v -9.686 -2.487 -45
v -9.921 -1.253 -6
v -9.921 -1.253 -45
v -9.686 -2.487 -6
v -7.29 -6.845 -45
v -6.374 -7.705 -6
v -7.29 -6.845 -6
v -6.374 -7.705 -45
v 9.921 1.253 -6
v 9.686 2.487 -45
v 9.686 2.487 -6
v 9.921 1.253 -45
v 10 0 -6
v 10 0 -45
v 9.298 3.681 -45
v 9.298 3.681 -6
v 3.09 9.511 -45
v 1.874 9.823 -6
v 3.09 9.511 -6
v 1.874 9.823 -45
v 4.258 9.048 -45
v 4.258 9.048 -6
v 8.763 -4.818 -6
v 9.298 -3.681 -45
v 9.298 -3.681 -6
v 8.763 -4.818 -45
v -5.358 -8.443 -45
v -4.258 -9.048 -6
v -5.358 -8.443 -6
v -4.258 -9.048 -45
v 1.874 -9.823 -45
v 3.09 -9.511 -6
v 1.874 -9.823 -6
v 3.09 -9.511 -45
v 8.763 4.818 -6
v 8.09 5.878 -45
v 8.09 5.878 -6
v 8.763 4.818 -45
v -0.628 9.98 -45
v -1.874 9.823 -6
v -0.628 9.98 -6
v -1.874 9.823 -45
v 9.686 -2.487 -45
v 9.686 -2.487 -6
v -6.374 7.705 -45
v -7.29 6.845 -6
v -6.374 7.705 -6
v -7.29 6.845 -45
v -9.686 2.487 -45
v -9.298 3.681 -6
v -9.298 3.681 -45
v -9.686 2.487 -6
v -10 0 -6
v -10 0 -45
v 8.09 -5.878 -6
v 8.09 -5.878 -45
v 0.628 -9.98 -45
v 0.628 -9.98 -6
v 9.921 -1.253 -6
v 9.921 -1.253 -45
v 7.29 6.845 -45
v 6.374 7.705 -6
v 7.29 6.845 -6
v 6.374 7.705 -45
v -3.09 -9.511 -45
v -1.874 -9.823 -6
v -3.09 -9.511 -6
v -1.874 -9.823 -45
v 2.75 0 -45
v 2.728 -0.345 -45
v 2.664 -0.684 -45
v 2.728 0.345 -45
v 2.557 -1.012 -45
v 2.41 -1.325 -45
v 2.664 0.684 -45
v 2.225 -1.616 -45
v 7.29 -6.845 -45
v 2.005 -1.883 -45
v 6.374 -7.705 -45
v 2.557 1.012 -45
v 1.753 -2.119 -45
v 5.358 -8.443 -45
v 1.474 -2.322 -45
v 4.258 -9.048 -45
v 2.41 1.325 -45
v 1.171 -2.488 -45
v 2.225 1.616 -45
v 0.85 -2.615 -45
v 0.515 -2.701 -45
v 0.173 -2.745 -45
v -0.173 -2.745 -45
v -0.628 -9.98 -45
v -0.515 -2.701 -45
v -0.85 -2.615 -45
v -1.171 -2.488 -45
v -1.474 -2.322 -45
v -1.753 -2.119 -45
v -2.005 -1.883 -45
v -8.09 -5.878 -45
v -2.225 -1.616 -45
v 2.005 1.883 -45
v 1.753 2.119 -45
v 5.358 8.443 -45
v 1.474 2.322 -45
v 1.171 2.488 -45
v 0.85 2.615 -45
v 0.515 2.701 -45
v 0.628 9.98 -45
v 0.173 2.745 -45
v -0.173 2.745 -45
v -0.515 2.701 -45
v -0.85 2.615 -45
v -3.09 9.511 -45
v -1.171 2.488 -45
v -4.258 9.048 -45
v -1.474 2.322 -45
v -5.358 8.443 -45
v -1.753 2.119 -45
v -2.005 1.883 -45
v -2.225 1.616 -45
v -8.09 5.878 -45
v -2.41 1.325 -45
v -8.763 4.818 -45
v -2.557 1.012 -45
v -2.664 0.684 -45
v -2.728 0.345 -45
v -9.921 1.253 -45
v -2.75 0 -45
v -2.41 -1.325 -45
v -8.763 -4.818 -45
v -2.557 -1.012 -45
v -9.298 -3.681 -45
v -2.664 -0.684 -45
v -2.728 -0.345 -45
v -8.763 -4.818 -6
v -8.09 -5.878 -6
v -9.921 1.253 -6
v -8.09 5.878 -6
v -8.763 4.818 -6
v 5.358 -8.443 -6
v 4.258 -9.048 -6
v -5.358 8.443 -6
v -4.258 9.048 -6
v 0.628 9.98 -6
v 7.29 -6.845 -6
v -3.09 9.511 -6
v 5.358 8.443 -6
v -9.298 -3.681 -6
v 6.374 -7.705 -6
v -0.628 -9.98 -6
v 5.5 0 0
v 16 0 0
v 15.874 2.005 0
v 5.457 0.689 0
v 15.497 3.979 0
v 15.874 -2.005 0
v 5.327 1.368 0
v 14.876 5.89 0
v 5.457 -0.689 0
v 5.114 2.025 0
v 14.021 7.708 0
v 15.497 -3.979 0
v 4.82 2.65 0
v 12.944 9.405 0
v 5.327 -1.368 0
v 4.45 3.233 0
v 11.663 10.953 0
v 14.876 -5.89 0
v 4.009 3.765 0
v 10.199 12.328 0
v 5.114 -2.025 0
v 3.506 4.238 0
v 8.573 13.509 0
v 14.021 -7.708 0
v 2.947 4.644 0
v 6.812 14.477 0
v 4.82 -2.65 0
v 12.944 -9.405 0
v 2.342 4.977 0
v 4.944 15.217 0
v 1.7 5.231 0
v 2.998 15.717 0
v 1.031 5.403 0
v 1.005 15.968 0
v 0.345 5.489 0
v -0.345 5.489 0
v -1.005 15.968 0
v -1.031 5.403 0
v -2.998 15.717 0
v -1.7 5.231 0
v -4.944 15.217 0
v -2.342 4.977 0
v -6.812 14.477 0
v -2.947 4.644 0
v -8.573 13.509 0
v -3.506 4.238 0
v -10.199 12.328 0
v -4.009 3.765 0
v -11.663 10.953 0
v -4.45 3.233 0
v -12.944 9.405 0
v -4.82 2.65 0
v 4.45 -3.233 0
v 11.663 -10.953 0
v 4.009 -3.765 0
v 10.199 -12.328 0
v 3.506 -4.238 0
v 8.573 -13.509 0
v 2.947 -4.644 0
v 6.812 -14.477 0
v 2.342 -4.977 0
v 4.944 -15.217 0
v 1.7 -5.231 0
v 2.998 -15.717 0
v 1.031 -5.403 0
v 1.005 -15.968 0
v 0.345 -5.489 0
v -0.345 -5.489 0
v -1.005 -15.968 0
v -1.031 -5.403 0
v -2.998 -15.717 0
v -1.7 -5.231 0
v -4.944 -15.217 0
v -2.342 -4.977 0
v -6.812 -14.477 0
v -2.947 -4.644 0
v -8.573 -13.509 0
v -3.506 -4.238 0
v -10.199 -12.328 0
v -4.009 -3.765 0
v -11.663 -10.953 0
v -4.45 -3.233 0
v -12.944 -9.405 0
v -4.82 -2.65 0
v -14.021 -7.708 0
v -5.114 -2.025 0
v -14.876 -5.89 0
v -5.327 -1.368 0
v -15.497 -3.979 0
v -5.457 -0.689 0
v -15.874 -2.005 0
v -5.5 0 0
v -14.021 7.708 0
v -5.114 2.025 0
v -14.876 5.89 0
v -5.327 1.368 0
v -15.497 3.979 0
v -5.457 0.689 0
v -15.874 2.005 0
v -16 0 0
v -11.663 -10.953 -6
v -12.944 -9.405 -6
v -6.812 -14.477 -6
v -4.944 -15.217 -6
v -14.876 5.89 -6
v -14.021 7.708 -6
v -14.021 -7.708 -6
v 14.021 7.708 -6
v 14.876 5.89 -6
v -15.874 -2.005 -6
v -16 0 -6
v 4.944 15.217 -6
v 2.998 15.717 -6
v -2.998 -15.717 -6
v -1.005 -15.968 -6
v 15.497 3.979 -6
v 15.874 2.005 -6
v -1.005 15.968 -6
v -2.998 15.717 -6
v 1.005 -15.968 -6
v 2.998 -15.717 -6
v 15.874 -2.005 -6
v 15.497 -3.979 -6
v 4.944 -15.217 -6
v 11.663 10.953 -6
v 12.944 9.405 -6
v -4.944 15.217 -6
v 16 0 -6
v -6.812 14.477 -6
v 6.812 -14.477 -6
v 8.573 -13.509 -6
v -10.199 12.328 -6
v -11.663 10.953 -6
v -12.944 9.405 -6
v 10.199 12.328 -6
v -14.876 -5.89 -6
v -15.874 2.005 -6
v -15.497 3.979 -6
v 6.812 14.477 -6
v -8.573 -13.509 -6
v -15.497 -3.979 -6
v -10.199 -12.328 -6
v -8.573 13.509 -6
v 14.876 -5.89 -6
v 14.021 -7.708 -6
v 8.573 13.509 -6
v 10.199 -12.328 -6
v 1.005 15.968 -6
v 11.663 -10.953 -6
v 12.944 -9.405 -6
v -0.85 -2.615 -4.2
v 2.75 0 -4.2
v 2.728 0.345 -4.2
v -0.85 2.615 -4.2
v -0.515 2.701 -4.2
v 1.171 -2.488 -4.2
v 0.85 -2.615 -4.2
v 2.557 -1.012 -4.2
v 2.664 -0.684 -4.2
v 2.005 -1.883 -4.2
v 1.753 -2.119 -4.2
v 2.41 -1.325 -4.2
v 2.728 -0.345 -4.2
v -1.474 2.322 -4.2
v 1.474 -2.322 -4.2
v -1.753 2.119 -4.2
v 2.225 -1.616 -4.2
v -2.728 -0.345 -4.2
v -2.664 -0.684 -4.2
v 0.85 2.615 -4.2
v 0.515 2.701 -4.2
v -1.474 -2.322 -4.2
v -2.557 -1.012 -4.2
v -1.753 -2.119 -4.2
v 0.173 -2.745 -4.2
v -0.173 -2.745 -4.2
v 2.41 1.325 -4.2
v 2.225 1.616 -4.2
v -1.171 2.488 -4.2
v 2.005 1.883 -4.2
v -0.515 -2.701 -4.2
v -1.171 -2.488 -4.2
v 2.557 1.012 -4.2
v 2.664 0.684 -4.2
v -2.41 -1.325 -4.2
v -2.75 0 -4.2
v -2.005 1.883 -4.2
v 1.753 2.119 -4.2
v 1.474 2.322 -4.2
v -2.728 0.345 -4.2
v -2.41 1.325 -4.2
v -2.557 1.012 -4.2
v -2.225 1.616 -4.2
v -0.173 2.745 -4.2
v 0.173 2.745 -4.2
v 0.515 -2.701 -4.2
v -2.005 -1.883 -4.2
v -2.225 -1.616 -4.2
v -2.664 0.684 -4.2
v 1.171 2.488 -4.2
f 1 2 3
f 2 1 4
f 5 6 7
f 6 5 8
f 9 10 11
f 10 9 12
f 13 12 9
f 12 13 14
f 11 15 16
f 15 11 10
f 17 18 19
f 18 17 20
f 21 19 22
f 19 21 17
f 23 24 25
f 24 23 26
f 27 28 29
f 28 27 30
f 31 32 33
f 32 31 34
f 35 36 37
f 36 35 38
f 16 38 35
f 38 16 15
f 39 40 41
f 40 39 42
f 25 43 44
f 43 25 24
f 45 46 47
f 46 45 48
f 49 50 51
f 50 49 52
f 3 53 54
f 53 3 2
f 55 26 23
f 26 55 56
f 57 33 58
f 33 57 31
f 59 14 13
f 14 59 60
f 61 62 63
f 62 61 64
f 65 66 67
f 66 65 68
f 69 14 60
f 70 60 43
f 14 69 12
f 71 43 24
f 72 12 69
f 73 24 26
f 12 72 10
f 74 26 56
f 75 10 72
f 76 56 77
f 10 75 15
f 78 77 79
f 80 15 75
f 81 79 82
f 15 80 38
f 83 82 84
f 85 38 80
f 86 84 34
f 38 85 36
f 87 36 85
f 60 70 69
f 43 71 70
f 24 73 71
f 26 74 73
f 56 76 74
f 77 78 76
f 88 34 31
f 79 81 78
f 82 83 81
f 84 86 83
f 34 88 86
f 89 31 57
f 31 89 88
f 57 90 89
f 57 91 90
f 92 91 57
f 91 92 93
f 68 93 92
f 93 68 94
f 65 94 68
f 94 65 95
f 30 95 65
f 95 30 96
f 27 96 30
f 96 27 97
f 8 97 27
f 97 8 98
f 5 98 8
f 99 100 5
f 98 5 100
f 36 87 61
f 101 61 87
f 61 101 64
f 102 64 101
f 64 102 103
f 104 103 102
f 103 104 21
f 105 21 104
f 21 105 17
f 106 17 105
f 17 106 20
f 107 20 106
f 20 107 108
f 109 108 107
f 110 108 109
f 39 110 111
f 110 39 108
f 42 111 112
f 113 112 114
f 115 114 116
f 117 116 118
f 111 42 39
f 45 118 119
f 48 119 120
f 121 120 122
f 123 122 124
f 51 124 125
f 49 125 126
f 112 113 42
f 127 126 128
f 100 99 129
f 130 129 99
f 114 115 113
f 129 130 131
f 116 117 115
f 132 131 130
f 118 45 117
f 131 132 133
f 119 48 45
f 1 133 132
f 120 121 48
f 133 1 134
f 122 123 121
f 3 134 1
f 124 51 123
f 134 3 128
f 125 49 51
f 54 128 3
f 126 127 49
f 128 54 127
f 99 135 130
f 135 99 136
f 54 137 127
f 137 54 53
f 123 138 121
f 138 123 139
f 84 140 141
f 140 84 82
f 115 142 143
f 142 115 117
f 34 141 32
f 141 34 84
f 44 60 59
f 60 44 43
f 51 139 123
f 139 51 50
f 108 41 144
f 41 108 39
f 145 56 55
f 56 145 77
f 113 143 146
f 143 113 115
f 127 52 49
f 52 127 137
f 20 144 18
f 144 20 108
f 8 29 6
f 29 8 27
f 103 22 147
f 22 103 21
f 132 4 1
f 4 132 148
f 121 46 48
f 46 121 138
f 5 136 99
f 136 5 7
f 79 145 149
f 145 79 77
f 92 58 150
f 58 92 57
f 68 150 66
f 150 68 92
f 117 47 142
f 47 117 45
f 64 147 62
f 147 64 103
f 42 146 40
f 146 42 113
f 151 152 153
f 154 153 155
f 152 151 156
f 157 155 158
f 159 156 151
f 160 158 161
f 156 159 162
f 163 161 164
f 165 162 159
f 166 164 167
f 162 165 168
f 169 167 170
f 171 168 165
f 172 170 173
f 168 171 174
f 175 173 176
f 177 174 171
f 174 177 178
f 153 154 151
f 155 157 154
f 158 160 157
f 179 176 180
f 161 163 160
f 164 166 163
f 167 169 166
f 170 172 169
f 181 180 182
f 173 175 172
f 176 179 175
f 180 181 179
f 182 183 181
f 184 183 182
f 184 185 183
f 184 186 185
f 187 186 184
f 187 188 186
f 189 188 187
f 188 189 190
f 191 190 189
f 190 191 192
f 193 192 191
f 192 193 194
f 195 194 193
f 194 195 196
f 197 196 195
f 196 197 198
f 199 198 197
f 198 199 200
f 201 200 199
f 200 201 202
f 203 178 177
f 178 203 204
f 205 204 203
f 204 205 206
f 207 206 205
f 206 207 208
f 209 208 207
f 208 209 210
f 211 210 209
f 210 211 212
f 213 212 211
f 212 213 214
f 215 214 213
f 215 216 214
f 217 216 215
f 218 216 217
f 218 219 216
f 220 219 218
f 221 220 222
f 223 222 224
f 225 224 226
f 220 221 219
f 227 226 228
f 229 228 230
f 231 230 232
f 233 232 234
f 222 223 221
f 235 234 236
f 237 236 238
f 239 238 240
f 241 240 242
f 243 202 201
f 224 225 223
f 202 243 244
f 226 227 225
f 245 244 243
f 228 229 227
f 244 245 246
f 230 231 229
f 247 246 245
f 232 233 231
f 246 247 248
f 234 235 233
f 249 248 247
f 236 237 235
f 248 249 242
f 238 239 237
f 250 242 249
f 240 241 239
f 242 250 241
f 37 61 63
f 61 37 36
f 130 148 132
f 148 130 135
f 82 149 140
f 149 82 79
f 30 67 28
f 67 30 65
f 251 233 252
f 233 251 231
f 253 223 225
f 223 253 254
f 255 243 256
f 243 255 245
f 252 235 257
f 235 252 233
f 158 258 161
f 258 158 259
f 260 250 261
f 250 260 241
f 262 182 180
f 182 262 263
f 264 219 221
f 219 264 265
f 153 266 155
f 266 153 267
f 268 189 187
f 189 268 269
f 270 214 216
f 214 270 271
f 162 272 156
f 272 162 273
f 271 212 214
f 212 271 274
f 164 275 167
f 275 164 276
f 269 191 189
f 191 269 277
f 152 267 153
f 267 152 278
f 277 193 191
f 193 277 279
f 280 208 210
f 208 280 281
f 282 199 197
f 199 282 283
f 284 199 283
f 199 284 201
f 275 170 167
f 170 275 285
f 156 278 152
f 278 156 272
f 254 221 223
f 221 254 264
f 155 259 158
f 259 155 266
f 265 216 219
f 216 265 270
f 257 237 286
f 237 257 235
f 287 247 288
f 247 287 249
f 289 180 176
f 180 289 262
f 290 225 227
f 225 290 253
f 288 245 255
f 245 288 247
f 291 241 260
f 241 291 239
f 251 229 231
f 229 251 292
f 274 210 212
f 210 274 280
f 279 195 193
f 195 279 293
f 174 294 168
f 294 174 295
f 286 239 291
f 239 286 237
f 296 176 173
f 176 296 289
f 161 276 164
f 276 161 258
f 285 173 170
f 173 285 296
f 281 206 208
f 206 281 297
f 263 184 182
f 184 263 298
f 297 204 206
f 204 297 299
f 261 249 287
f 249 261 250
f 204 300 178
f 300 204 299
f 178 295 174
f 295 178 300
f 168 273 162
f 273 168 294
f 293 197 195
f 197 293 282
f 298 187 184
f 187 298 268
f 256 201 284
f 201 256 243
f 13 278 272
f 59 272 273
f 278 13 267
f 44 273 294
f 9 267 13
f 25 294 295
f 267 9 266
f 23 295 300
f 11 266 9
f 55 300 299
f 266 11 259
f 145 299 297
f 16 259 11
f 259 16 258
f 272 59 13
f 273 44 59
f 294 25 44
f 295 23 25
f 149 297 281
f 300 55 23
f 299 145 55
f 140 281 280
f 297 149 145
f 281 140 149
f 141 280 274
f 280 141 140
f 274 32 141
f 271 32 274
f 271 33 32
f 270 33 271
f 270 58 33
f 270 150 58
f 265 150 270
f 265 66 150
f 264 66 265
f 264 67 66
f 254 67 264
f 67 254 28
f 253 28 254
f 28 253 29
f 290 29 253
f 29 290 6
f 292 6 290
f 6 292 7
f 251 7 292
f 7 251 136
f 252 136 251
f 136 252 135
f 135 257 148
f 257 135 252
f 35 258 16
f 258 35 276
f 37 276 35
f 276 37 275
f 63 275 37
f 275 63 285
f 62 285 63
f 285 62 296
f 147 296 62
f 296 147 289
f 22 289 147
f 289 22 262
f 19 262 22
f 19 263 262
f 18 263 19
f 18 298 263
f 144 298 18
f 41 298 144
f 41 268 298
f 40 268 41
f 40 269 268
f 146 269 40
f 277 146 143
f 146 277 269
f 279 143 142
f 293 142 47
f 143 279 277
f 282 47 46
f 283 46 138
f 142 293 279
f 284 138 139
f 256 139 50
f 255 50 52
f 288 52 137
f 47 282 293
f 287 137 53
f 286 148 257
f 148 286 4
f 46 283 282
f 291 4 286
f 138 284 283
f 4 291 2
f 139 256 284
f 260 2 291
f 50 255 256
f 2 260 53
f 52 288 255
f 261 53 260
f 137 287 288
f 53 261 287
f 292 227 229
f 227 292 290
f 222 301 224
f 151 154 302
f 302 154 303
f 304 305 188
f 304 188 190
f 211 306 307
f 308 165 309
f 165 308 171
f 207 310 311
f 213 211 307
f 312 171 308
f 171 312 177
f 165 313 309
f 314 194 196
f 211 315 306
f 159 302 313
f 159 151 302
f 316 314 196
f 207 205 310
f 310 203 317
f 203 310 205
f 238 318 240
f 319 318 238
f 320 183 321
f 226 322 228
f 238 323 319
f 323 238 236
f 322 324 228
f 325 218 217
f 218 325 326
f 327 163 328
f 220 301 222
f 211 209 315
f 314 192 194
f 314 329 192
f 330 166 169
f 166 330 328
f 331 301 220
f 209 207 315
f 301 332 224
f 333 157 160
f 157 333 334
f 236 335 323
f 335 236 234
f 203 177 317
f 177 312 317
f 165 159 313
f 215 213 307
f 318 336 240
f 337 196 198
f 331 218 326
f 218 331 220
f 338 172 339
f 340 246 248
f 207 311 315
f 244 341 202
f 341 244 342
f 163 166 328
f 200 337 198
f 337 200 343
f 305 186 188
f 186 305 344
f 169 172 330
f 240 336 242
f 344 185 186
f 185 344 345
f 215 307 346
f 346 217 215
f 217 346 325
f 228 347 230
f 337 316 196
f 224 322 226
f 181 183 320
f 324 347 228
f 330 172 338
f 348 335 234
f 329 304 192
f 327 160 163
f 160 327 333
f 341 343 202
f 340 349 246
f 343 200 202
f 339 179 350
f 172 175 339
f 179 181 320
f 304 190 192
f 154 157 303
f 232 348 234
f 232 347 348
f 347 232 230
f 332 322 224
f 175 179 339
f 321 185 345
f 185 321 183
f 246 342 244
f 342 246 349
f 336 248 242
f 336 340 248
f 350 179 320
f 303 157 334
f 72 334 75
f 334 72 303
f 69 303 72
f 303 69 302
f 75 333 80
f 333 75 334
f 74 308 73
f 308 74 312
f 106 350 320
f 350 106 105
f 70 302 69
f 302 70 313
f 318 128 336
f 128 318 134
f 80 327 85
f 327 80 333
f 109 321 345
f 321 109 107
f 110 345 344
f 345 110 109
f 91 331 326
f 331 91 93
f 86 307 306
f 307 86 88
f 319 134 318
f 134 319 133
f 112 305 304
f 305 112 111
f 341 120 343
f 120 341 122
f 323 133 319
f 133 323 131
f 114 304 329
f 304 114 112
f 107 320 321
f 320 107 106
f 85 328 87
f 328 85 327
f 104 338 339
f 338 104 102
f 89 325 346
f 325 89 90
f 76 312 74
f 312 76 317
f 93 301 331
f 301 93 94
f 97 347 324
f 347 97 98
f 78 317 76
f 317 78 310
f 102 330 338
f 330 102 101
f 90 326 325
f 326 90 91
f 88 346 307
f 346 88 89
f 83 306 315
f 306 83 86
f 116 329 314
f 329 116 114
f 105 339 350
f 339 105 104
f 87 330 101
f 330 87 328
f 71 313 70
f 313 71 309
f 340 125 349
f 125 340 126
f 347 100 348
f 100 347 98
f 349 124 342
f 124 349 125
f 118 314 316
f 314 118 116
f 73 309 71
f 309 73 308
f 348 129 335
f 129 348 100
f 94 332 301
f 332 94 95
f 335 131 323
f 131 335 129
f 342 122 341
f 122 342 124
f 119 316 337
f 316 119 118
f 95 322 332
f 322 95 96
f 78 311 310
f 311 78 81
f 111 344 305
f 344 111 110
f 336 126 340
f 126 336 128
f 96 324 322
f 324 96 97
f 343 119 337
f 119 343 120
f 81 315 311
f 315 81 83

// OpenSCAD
$fn = 50;


difference() {
	union() {
		translate(v = [0, 0, -45.0000000000]) {
			cylinder(h = 45, r = 10.0000000000);
		}
		translate(v = [0, 0, -6.0000000000]) {
			cylinder(h = 6, r = 16.0000000000);
		}
	}
	union() {
		translate(v = [0, 0, 0]) {
			rotate(a = [0, 0, 0]) {
				difference() {
					union() {
						#translate(v = [0, 0, -45.0000000000]) {
							cylinder(h = 45, r = 2.2500000000);
						}
						#translate(v = [0, 0, -4.2000000000]) {
							cylinder(h = 4.2000000000, r1 = 2.7500000000, r2 = 5.5000000000);
						}
						#translate(v = [0, 0, -45.0000000000]) {
							cylinder(h = 45, r = 2.7500000000);
						}
						#translate(v = [0, 0, -45.0000000000]) {
							cylinder(h = 45, r = 2.2500000000);
						}
					}
					union();
				}
			}
		}
	}
}
